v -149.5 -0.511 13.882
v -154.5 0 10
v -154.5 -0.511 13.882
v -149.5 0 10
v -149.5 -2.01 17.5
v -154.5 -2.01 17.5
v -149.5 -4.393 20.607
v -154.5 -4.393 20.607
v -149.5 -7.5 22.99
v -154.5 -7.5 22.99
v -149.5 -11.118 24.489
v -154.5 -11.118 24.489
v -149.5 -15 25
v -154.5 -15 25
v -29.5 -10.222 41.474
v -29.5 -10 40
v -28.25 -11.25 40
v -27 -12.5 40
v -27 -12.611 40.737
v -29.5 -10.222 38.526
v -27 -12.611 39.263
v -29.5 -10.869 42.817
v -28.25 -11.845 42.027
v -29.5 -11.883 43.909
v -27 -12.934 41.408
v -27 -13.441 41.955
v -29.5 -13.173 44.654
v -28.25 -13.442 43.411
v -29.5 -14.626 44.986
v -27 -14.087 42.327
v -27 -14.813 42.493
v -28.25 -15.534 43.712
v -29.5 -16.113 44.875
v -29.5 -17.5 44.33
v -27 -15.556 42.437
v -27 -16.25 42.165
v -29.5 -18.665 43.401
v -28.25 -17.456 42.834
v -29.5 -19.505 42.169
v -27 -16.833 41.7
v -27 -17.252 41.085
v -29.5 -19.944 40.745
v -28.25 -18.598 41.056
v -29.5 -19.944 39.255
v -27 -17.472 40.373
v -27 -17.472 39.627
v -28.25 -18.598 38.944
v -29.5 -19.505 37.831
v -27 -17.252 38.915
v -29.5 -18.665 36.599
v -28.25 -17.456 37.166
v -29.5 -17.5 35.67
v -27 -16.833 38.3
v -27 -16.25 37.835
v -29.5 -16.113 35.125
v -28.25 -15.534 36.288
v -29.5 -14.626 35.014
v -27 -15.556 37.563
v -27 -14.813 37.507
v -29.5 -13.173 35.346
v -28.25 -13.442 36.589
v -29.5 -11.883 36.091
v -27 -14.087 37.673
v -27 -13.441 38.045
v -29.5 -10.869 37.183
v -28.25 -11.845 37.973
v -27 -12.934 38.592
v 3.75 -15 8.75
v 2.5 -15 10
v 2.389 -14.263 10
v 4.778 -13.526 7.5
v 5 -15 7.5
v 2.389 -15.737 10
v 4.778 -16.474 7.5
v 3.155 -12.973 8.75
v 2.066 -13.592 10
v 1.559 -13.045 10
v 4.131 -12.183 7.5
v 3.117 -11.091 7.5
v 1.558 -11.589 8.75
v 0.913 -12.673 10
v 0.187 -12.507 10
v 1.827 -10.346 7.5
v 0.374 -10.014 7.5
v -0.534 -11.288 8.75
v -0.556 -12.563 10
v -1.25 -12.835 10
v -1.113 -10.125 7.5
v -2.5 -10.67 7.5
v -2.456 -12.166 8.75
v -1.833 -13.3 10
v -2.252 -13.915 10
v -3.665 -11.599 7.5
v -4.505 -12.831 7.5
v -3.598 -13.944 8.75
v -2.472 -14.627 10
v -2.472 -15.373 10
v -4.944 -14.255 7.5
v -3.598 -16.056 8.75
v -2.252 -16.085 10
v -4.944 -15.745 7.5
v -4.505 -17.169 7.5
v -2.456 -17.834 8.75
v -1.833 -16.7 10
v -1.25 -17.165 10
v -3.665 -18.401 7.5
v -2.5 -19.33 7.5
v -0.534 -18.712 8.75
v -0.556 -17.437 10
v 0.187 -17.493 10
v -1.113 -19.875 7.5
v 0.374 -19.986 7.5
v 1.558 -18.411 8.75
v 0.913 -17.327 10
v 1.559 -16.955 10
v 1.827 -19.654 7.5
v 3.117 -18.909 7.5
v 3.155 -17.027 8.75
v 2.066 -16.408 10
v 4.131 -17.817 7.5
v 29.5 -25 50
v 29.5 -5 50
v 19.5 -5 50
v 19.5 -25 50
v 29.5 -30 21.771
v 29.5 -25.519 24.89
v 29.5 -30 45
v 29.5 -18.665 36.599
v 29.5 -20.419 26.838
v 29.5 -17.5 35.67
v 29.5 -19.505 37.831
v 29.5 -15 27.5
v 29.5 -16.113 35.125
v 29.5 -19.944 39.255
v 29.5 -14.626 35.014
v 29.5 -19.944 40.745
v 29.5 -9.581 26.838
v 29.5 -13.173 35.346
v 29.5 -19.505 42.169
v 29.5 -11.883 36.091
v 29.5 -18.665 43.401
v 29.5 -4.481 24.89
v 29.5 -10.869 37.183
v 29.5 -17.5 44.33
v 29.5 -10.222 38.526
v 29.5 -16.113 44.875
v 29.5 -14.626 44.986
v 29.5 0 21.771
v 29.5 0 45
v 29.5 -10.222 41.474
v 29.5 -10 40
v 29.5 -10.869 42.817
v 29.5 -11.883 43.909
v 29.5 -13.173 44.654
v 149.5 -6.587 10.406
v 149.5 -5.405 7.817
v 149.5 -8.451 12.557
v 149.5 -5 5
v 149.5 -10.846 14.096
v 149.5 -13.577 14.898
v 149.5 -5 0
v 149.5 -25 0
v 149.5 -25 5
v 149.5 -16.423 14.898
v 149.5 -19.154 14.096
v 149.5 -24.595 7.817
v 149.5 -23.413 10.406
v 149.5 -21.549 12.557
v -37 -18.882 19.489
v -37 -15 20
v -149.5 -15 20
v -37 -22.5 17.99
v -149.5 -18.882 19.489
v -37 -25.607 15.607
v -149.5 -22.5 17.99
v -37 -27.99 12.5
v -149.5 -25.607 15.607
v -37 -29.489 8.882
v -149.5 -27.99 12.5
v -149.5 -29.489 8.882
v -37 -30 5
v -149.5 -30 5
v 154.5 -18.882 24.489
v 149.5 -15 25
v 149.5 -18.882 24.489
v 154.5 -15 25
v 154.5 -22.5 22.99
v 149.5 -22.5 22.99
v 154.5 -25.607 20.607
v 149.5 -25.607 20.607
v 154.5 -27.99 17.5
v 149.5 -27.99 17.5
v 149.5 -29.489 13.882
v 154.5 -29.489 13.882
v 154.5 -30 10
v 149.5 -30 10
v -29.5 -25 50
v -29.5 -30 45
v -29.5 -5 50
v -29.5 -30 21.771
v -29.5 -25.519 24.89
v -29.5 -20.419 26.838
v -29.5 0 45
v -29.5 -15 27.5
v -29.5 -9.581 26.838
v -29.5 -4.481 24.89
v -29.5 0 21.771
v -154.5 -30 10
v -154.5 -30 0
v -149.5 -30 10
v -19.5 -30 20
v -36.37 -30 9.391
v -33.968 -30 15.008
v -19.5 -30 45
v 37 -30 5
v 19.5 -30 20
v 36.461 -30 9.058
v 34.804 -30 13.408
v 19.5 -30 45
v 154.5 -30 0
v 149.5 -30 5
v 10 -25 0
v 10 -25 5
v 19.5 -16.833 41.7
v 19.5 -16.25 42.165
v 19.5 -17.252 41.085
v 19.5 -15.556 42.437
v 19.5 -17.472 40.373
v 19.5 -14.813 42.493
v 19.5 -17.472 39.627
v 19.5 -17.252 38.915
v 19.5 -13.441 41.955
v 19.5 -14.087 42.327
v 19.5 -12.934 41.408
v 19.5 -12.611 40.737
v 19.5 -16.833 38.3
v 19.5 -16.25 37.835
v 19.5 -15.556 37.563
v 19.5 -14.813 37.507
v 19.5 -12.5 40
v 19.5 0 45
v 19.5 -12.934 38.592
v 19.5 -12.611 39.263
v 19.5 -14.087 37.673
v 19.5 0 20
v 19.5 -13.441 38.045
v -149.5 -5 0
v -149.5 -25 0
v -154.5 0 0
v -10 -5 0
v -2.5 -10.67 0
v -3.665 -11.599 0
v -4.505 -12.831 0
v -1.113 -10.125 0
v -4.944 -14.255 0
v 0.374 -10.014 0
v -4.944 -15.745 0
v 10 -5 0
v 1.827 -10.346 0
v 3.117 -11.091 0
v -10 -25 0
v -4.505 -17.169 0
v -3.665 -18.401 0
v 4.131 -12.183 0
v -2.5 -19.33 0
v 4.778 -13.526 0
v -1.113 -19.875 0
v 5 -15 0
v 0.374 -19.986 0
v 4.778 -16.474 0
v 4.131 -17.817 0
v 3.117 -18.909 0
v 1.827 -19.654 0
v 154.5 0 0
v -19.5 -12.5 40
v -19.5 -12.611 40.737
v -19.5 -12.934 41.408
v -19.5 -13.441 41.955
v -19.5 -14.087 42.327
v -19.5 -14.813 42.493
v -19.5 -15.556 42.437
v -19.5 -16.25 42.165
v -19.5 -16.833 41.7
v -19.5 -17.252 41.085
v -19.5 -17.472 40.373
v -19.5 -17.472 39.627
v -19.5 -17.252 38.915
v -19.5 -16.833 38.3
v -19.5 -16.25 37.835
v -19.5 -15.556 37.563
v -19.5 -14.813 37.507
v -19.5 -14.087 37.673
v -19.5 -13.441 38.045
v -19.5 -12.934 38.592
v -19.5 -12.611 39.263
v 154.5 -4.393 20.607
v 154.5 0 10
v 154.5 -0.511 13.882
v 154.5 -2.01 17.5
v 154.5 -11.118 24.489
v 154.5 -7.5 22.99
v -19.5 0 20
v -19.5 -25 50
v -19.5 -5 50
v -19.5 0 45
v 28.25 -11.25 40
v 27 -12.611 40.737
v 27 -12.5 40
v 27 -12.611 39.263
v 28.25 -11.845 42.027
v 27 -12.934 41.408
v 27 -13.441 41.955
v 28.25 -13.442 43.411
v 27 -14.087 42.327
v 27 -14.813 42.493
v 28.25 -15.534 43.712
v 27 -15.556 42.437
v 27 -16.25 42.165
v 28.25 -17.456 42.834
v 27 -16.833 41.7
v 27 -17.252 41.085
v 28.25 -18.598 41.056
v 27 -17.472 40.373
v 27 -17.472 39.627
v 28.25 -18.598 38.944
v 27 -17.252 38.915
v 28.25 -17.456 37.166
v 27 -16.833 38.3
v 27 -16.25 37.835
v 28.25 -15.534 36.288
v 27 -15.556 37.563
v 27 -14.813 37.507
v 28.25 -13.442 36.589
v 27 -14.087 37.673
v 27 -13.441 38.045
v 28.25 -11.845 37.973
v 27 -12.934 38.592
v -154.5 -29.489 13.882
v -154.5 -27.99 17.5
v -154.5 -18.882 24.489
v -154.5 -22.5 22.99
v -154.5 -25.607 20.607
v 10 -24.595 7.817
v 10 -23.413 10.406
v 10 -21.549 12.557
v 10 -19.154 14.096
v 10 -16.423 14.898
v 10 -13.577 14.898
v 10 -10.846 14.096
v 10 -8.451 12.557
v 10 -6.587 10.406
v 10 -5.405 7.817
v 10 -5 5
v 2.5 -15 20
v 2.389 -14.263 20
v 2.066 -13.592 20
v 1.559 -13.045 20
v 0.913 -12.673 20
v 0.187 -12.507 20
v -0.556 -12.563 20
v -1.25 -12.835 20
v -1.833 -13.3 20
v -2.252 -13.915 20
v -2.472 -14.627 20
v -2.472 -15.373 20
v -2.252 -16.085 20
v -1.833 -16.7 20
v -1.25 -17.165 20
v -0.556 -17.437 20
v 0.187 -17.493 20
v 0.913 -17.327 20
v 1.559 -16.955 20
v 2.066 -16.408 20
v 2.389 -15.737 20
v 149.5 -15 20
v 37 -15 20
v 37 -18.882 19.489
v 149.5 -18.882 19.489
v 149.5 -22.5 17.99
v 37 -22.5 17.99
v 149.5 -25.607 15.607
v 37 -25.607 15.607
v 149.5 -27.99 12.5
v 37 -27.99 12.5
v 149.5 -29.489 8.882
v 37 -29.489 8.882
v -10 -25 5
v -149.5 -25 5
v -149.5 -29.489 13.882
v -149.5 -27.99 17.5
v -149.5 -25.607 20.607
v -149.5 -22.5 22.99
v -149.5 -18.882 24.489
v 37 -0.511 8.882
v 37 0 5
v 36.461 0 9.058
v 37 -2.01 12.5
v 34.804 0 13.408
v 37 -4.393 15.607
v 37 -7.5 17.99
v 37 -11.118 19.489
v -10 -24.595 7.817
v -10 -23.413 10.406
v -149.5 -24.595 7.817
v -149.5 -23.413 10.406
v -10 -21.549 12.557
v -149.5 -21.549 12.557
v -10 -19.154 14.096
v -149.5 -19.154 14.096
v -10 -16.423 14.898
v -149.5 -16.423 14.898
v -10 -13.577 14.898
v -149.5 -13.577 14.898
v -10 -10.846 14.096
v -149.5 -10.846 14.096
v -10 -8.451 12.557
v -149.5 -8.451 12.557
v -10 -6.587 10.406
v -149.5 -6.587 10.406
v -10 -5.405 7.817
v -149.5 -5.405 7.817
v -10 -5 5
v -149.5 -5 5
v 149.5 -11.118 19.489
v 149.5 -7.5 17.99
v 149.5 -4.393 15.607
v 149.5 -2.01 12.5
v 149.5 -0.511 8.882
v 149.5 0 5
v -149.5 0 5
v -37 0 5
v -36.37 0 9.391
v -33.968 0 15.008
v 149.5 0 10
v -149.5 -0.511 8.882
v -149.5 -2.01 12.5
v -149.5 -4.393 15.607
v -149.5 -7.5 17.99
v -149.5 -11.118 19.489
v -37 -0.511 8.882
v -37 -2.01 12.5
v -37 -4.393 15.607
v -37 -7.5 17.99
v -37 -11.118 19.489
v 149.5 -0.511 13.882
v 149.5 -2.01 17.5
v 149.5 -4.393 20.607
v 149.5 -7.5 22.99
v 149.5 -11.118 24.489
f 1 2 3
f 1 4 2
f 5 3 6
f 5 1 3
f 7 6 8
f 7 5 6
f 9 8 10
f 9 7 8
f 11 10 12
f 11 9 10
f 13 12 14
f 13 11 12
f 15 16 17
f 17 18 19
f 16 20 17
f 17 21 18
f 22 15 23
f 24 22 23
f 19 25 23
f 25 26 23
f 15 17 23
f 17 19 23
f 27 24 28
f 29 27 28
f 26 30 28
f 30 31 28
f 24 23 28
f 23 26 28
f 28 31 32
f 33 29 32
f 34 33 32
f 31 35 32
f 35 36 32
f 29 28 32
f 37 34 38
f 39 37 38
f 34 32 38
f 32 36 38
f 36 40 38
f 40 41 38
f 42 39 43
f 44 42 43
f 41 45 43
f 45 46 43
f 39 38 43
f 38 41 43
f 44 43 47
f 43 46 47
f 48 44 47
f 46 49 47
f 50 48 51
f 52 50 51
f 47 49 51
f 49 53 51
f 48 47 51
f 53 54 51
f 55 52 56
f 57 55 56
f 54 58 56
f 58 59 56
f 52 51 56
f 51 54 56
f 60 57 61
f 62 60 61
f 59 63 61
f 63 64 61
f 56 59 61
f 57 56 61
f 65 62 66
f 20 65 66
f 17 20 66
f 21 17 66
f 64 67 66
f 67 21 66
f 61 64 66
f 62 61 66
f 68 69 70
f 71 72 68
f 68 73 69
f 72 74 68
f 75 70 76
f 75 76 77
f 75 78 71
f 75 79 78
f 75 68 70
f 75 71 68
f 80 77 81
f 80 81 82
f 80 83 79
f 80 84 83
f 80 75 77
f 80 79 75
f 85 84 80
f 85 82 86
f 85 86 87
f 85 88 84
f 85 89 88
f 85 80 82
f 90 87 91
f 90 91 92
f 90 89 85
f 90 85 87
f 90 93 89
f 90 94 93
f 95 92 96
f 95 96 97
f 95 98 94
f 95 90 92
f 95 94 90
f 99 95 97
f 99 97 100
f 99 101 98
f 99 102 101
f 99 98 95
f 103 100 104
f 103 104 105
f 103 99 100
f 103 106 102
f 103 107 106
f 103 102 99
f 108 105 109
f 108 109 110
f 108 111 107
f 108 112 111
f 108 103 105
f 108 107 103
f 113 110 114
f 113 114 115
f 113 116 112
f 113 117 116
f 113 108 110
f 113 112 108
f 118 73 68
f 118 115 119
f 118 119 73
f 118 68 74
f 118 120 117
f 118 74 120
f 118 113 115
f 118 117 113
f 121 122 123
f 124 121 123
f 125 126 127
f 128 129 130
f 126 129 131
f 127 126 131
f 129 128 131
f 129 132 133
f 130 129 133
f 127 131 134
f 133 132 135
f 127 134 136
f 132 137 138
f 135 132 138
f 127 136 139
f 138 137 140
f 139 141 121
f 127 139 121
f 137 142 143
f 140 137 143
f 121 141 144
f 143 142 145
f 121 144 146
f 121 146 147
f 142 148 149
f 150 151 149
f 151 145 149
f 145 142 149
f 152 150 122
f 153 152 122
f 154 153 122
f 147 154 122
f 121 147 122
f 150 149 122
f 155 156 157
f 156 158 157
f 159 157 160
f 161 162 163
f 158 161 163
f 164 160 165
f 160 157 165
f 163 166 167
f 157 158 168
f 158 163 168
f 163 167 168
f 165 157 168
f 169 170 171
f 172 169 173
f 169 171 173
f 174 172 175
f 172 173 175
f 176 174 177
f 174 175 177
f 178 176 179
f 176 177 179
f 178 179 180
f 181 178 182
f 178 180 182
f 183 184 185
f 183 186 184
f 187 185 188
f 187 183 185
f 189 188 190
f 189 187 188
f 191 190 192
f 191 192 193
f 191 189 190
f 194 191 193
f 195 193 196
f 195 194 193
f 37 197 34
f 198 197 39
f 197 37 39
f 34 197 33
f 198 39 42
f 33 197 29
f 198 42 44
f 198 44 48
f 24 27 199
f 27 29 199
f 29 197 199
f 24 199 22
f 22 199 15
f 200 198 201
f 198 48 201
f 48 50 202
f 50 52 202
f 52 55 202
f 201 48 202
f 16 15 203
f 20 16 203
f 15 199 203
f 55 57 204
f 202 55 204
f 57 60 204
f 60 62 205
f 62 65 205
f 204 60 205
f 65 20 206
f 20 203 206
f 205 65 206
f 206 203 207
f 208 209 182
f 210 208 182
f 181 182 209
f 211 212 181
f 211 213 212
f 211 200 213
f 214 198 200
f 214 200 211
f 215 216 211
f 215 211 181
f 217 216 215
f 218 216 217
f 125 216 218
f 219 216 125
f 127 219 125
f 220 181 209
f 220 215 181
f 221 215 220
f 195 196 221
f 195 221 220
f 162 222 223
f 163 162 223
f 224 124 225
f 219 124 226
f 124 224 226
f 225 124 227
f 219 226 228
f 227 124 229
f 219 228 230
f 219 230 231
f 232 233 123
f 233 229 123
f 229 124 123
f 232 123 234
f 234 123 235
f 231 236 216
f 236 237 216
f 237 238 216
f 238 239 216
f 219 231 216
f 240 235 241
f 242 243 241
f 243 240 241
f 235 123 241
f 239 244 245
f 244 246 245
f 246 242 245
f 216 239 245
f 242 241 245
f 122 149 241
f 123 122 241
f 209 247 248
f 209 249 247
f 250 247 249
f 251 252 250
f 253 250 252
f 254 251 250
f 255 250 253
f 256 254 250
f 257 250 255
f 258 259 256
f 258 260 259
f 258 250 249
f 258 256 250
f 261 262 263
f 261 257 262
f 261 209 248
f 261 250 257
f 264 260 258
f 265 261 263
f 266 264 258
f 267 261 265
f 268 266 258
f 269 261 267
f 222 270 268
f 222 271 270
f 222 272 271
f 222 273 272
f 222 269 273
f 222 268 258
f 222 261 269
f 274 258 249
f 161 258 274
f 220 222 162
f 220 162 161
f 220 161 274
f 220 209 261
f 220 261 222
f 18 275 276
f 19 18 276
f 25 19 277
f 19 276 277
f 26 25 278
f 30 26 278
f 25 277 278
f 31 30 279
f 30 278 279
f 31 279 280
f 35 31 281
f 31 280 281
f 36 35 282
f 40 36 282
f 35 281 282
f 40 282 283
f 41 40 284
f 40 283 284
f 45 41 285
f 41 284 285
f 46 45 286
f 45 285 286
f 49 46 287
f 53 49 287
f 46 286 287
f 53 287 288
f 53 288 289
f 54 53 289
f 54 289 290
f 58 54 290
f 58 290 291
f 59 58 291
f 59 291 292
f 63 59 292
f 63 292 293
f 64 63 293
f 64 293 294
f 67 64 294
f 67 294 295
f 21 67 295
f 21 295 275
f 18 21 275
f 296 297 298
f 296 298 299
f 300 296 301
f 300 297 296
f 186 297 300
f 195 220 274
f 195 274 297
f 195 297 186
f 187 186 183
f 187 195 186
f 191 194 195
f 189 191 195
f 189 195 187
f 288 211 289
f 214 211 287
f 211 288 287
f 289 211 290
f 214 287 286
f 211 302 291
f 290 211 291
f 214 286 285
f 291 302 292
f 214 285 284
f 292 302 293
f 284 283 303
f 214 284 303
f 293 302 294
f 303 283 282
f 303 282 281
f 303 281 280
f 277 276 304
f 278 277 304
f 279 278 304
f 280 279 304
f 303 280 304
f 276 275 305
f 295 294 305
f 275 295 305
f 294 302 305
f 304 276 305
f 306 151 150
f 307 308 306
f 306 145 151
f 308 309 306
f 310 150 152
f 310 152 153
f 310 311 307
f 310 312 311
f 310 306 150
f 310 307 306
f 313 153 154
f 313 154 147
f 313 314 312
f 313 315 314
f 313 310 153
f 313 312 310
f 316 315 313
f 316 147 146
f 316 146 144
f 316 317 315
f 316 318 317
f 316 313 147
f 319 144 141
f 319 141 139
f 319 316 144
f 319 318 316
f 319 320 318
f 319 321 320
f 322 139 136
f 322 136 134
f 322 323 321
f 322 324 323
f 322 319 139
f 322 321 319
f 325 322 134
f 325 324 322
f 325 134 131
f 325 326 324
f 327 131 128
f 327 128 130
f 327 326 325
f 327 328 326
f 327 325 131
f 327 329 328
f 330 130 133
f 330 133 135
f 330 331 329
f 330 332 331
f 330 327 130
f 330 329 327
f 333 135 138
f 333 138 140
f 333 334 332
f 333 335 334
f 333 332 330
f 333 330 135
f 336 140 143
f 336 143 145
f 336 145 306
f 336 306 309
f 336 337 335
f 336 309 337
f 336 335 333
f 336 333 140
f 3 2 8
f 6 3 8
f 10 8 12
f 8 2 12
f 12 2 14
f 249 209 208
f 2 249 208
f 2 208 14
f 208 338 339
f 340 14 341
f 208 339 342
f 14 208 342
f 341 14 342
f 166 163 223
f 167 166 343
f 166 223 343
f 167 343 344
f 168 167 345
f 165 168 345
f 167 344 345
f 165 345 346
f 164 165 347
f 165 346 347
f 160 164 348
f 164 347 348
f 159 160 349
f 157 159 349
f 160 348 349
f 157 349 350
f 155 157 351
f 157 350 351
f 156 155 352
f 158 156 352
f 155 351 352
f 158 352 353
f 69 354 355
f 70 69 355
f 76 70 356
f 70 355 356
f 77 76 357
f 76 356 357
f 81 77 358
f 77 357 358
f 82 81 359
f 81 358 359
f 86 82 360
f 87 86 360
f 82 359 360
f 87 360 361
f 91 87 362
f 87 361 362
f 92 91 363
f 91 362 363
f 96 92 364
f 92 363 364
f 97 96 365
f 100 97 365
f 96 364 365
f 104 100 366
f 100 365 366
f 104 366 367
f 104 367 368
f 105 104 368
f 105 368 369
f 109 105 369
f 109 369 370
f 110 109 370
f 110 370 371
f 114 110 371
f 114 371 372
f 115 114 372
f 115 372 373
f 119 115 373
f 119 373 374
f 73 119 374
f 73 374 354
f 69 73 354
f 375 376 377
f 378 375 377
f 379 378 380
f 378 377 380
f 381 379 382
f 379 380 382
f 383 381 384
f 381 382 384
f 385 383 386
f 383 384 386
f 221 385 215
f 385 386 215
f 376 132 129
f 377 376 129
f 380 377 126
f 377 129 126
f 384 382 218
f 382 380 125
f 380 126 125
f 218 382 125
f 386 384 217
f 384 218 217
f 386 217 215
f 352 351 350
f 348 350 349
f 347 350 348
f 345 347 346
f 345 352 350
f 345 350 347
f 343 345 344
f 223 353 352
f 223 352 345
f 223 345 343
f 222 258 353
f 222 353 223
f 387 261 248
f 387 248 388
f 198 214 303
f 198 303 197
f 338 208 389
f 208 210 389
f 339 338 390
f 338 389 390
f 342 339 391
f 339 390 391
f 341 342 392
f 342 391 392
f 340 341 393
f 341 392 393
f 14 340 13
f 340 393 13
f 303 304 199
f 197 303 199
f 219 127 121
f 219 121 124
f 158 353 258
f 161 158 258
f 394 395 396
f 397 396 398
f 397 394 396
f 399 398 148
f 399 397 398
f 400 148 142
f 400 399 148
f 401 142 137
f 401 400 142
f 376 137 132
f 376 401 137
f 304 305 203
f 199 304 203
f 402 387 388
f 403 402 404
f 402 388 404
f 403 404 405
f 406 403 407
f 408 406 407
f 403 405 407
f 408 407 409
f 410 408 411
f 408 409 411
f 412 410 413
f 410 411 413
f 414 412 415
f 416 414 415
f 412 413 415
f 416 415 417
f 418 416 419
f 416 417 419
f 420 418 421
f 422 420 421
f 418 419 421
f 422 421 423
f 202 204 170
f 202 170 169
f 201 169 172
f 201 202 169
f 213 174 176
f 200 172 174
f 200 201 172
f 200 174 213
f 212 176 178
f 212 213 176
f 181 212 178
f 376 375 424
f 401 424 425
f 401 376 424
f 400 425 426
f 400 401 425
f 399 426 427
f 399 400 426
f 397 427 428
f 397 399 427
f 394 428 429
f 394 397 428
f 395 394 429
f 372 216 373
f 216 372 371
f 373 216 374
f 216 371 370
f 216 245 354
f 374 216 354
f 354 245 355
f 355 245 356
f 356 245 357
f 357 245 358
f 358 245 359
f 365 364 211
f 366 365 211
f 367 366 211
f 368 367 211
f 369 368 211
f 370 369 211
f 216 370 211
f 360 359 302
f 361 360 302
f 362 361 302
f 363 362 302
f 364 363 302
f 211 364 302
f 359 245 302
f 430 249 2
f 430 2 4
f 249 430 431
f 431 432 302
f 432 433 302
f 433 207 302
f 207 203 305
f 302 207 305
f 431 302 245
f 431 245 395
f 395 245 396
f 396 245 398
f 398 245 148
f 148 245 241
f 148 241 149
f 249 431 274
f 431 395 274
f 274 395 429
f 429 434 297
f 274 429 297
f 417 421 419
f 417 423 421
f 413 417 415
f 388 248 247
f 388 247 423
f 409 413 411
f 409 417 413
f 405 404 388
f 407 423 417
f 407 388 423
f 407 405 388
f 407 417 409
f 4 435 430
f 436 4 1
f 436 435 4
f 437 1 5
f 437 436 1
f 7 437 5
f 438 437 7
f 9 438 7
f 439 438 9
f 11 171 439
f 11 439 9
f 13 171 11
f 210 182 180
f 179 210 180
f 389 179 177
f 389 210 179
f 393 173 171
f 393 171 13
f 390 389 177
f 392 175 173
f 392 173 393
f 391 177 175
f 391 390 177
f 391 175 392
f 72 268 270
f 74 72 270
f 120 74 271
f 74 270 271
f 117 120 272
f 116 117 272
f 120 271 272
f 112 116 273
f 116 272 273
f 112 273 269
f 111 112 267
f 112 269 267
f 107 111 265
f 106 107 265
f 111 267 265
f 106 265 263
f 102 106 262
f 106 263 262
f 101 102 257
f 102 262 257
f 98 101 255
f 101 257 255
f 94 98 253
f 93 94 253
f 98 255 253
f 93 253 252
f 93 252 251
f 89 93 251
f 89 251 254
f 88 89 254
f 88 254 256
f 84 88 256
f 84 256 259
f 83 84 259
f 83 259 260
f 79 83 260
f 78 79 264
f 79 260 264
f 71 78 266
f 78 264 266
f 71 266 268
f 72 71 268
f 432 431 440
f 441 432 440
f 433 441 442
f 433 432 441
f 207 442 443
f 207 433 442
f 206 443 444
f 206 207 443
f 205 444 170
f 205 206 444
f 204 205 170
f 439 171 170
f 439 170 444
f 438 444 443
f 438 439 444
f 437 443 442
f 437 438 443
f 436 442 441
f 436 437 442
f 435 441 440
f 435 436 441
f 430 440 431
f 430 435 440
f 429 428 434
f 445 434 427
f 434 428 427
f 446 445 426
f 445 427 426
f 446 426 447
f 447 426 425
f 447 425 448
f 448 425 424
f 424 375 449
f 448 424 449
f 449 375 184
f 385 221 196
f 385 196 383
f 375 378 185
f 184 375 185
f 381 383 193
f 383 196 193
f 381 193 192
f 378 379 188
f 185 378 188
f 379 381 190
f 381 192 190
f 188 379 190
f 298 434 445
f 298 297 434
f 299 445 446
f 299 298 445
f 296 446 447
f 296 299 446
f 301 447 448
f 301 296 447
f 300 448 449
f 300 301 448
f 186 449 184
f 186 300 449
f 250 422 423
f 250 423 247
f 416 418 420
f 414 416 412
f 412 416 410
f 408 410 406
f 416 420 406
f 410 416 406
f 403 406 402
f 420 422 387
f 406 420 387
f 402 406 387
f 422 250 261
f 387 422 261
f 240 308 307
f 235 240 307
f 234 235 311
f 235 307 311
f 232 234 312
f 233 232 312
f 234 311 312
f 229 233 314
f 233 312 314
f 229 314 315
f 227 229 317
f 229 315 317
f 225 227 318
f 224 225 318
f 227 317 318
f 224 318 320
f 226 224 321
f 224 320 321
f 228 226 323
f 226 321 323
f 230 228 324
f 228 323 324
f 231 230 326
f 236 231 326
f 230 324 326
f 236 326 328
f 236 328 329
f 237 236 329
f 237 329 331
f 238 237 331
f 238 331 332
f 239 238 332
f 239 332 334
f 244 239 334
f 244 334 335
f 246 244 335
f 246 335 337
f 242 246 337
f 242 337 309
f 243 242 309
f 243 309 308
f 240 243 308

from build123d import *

# Parameters (mm, degrees)
F1_DEPTH     = 30
F2_R         = 14.99999
F4_DEPTH     = 299.001
F5_T1_DEPTH  = 2e-05
F5_T6_ANGLE  = 163.702935025
F5_T12_ANGLE = 163.702935025
F5_T18_ANGLE = 163.702935025
F5_T24_ANGLE = 163.702935025
F6_SIZE      = 5
F7_R         = 2.5
F8_DEPTH     = 179.001
F9_W         = 20
F9_H         = 20
F11_R        = 2.5
F12_DEPTH    = 20.001
F13_SIZE     = 2.5
F14_W        = 5
F14_H        = 25
F15_DEPTH    = 30
F16_R        = 14.99999
F17_R        = 5
F18_DEPTH    = 7.5
F19_SIZE     = 2.49999


# Not quite as in the source:
# - a fillet or chamfer that OpenCascade refuses, or shapes differently, is made with other operations: its cross-section is extruded or revolved along the edge and cut away or added
# - a fillet or chamfer is up to 0.001 mm smaller than in the source, because OpenCascade refuses the exact size


with BuildPart() as f1:
    # F0 (on Front) → F1 (new body)
    with BuildSketch(Plane.XZ):
        Polygon((-149.5, 0), (0, 0), (149.5, 0), (149.5, 20), (29.5, 20), (29.5, 50), (19.5, 50), (19.5, 20), (0, 20), (-19.5, 20), (-19.5, 50), (-29.5, 50), (-29.5, 20), (-149.5, 20), align=None)
    extrude(amount=F1_DEPTH)

    # F2 (radius 15 in the source; OpenCascade refuses exactly that, so slightly less here)
    f2_edges = [f1.edges().sort_by_distance(p)[0] for p in [
        (-89.5, 0, 20),
        (-89.5, -30, 20),
        (89.5, 0, 20),
        (89.5, -30, 20),
    ]]
    fillet(f2_edges, radius=F2_R)

    # F3 (on face) → F4 (cut, through all)
    with BuildSketch(Plane(origin=(-149.5, 0, 0), x_dir=(0, -1, 0), z_dir=(-1, 0, 0))):
        with BuildLine():
            Line((25, 0), (25, 5))
            ThreePointArc((25, 5), (15, 15), (5, 5))
            Line((5, 5), (5, 0))
            Line((5, 0), (25, 0))
        make_face()
    extrude(amount=-F4_DEPTH, mode=Mode.SUBTRACT)

    # F5: chamfer of 7.5 on 4 edges, made by hand

    # F5_s2 → F5_t1 (join)
    with BuildSketch(Plane.XZ.offset(14.99999)):
        Polygon((-37, 20), (-29.5, 27.5), (-29.5, 20), align=None)
        Polygon((37, 20), (29.5, 27.5), (29.5, 20), align=None)
    extrude(amount=F5_T1_DEPTH)


with BuildPart() as f5_tool4:
    # F5_s5 → F5_t6 (revolve)
    with BuildSketch(Plane(origin=(0, -12.4720838446, -3.6463990318), x_dir=(1, 0, 0), z_dir=(0, -0.9598196681, -0.2806175417))):
        Polygon((-37, -5.9916217418), (-29.5, -13.4916217418), (-29.5, -5.9916217418), align=None)
    revolve(axis=Axis((-29.5, -14.99999, 5.00001), (1, 0, 0)), revolution_arc=F5_T6_ANGLE)

    split(bisect_by=Plane.XZ, keep=Keep.TOP)

    split(bisect_by=Plane.XY, keep=Keep.TOP)


with BuildPart() as f1_1:
    add(f1.part)

    # F5_t3: union F5_tool4
    add(f5_tool4.part)


with BuildPart() as f5_tool10:
    # F5_s11 → F5_t12 (revolve)
    with BuildSketch(Plane(origin=(0, -12.4720838446, -3.6463990318), x_dir=(1, 0, 0), z_dir=(0, -0.9598196681, -0.2806175417))):
        Polygon((29.5, -13.4916217418), (37, -5.9916217418), (29.5, -5.9916217418), align=None)
    revolve(axis=Axis((29.5, -14.99999, 5.00001), (1, 0, 0)), revolution_arc=F5_T12_ANGLE)

    split(bisect_by=Plane.XZ, keep=Keep.TOP)

    split(bisect_by=Plane.XY, keep=Keep.TOP)


with BuildPart() as f1_2:
    add(f1_1.part)

    # F5_t9: union F5_tool10
    add(f5_tool10.part)


with BuildPart() as f5_tool16:
    # F5_s17 → F5_t18 (revolve)
    with BuildSketch(Plane.XZ.offset(15.00001)):
        Polygon((37, 20), (29.5, 27.5), (29.5, 20), align=None)
    revolve(axis=Axis((29.5, -15.00001, 5.00001), (1, 0, 0)), revolution_arc=F5_T18_ANGLE)

    split(bisect_by=Plane.XY, keep=Keep.TOP)

    split(bisect_by=Plane.XZ.offset(30), keep=Keep.BOTTOM)


with BuildPart() as f1_3:
    add(f1_2.part)

    # F5_t15: union F5_tool16
    add(f5_tool16.part)


with BuildPart() as f5_tool22:
    # F5_s23 → F5_t24 (revolve)
    with BuildSketch(Plane.XZ.offset(15.00001)):
        Polygon((-37, 20), (-29.5, 27.5), (-29.5, 20), align=None)
    revolve(axis=Axis((-29.5, -15.00001, 5.00001), (1, 0, 0)), revolution_arc=F5_T24_ANGLE)

    split(bisect_by=Plane.XY, keep=Keep.TOP)

    split(bisect_by=Plane.XZ.offset(30), keep=Keep.BOTTOM)


with BuildPart() as f1_4:
    add(f1_3.part)

    # F5_t21: union F5_tool22
    add(f5_tool22.part)

    # F6
    f6_edges = [f1_4.edges().sort_by_distance(p)[0] for p in [
        (-24.5, 0, 50),
        (-24.5, -30, 50),
        (24.5, 0, 50),
        (24.5, -30, 50),
    ]]
    chamfer(f6_edges, length=F6_SIZE)

    # F7 (on face) → F8 (cut, through all)
    with BuildSketch(Plane.YZ.offset(29.5)):
        with Locations((-15, 40)):
            Circle(F7_R)
    extrude(amount=-F8_DEPTH, mode=Mode.SUBTRACT)

    # F9 (on face) → F10 (join, up to the next surface of F1)
    with BuildSketch(Plane(origin=(0, 0, 0), x_dir=(1, 0, 0), z_dir=(0, 0, -1))):
        with Locations((0, 15)):
            Rectangle(F9_W, F9_H)
    extrude(until=Until.NEXT, dir=(0, 0, 1))

    # F11 (on face) → F12 (cut, through all)
    with BuildSketch(Plane.XY.offset(20)):
        with Locations((0, -15)):
            Circle(F11_R)
    extrude(amount=-F12_DEPTH, mode=Mode.SUBTRACT)

    # F13
    f13_edges = [f1_4.edges().sort_by_distance(p)[0] for p in [
        (-29.5, -17.5, 40),
        (29.5, -17.5, 40),
    ]]
    chamfer(f13_edges, length=F13_SIZE)

    # F14 (on face) → F15 (join, through all)
    with BuildSketch(Plane.XZ.offset(30)):
        with Locations((-152, 12.5)):
            Rectangle(F14_W, F14_H)
        with Locations((152, 12.5)):
            Rectangle(F14_W, F14_H)
    extrude(amount=-F15_DEPTH)

    # F16 (radius 15 in the source; OpenCascade refuses exactly that, so slightly less here)
    f16_edges = [f1_4.edges().sort_by_distance(p)[0] for p in [
        (152, 0, 25),
        (152, -30, 25),
        (-152, -30, 25),
        (-152, 0, 25),
    ]]
    fillet(f16_edges, radius=F16_R)

    # F17 (on face) → F18 (cut)
    with BuildSketch(Plane(origin=(0, 0, 0), x_dir=(1, 0, 0), z_dir=(0, 0, -1))):
        with Locations((0, 15)):
            Circle(F17_R)
    extrude(amount=-F18_DEPTH, mode=Mode.SUBTRACT)

    # F19 (size 2.5 in the source; OpenCascade refuses exactly that, so slightly less here)
    f19_edges = [f1_4.edges().sort_by_distance(p)[0] for p in [
        (-2.5, -15, 7.5),
    ]]
    chamfer(f19_edges, length=F19_SIZE)


solid = f1_4.part
